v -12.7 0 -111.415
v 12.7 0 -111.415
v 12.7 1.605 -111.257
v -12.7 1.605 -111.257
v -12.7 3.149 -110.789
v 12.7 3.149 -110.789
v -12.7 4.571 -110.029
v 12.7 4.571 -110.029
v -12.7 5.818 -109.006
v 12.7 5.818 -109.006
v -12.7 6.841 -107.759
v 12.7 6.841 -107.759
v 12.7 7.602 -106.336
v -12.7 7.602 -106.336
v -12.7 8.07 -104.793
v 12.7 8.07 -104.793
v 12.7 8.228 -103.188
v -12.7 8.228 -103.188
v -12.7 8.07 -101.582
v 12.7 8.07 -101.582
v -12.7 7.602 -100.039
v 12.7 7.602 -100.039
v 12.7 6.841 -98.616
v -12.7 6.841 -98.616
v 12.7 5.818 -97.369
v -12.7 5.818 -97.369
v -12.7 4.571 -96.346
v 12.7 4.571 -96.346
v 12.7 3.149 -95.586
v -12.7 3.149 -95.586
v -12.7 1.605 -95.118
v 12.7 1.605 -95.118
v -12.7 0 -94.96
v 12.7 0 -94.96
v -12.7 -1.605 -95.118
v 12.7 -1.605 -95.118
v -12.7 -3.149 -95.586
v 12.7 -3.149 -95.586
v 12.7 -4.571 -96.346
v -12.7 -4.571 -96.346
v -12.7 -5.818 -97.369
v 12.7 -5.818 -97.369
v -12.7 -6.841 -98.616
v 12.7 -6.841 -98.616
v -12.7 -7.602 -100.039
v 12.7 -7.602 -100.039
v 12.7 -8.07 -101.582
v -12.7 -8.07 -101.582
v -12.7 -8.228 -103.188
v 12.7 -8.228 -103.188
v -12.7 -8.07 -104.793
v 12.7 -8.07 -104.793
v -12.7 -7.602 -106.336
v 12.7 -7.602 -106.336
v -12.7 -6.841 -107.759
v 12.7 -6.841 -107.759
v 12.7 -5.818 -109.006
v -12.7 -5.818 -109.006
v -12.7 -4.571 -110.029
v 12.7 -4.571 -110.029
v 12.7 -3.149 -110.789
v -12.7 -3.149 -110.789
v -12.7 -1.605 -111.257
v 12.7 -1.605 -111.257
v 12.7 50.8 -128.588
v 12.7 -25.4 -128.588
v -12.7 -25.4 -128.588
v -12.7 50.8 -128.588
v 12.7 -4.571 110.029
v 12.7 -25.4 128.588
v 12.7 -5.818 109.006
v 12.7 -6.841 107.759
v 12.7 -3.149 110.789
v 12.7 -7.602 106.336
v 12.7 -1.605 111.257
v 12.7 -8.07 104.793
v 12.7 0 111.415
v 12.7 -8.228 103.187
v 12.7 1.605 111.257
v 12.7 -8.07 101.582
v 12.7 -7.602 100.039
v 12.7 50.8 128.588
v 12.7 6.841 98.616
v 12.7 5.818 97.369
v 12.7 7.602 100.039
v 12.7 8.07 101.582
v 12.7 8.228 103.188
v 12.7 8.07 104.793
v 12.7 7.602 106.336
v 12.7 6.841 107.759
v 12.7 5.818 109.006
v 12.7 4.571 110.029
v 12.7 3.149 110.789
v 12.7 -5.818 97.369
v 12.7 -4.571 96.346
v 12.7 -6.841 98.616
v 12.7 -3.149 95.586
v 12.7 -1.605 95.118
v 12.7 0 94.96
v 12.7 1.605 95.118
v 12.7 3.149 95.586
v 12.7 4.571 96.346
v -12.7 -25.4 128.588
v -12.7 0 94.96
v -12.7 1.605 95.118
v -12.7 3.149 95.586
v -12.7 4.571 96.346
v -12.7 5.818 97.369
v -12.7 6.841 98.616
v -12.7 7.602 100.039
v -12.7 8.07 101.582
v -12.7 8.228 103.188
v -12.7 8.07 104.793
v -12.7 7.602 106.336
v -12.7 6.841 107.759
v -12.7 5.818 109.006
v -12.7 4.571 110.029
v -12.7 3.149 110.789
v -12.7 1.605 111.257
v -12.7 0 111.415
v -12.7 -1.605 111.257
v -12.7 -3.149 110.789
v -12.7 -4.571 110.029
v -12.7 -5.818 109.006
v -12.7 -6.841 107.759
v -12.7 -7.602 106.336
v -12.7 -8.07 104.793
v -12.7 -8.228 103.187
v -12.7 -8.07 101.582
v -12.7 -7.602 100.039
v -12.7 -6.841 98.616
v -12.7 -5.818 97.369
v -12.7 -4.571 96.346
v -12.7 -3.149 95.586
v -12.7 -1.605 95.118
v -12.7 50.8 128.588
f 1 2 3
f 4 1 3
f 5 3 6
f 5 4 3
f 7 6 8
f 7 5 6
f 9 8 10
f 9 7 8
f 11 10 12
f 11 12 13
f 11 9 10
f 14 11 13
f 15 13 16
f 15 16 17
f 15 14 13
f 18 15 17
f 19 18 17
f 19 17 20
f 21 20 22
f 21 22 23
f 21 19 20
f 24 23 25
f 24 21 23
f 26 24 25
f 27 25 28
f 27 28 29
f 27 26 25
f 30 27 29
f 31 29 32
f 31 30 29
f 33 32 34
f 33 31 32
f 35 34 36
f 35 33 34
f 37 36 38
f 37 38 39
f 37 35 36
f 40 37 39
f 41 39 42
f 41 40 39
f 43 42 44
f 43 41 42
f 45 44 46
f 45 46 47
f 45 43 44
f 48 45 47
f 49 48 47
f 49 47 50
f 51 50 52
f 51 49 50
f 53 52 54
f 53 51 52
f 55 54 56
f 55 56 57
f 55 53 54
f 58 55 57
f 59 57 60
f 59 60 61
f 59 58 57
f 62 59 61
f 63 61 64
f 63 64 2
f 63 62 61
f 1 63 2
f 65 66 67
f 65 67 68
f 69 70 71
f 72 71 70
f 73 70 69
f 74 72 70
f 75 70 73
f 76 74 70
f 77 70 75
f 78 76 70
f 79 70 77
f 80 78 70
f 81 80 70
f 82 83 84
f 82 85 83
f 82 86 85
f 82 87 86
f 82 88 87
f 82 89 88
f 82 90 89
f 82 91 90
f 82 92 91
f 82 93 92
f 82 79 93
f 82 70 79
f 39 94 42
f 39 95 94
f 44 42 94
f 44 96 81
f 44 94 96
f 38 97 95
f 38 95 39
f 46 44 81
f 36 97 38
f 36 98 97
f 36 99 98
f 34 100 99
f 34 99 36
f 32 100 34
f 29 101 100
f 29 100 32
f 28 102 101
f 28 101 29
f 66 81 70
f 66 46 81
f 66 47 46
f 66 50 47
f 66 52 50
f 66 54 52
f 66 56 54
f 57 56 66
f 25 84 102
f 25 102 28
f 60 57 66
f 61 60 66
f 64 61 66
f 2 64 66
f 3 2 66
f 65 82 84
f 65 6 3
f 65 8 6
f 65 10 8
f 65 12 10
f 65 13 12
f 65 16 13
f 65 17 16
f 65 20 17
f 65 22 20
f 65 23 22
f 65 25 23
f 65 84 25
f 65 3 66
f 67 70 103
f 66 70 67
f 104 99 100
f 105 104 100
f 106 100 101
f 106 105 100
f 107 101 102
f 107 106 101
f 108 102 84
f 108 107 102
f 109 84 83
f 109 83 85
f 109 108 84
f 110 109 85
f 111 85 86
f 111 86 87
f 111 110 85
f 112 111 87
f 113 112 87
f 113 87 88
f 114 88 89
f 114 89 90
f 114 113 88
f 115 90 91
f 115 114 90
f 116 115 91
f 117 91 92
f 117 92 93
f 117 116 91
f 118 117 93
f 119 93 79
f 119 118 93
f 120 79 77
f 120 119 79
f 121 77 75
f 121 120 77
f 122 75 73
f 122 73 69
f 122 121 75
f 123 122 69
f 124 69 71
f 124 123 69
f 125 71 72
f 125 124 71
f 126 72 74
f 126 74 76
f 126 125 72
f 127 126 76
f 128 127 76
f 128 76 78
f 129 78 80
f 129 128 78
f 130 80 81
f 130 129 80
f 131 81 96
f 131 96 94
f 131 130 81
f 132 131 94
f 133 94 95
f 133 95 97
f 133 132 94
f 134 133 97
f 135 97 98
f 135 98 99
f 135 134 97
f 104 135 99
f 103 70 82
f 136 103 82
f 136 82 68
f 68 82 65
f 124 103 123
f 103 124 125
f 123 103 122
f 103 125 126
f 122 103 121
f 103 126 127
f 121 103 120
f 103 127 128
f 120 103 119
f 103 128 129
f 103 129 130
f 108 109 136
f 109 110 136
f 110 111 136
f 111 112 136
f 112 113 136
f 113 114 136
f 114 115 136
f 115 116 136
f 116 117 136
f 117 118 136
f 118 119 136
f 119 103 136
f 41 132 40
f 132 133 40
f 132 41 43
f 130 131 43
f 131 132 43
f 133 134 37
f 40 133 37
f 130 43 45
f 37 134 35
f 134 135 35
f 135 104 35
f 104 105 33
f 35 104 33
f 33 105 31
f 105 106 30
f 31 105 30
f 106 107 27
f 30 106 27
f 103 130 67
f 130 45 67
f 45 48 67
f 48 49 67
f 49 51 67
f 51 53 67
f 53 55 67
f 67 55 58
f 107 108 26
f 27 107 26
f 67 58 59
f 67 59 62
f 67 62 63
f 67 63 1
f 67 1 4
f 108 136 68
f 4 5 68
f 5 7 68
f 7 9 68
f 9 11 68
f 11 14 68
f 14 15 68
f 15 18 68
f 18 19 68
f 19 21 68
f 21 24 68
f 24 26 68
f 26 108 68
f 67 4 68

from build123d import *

# Parameters (mm, degrees)
SKETCH1_W      = 257.175
SKETCH1_H      = 76.2
SKETCH1_R      = 8.227896341
EXTRUDE1_DEPTH = 12.7


with BuildPart() as part:
    # Sketch1 → Extrude1 (new, symmetric)
    with BuildSketch(Plane(origin=(0, 0, 0), x_dir=(0, 0, -1), z_dir=(1, 0, 0))):
        with Locations((0, 12.7)):
            Rectangle(SKETCH1_W, SKETCH1_H)
        with Locations((-103.1875, 0)):
            Circle(SKETCH1_R, mode=Mode.SUBTRACT)
        with Locations((103.1875, 0)):
            Circle(SKETCH1_R, mode=Mode.SUBTRACT)
    extrude(amount=EXTRUDE1_DEPTH, both=True)


solid = part.part
